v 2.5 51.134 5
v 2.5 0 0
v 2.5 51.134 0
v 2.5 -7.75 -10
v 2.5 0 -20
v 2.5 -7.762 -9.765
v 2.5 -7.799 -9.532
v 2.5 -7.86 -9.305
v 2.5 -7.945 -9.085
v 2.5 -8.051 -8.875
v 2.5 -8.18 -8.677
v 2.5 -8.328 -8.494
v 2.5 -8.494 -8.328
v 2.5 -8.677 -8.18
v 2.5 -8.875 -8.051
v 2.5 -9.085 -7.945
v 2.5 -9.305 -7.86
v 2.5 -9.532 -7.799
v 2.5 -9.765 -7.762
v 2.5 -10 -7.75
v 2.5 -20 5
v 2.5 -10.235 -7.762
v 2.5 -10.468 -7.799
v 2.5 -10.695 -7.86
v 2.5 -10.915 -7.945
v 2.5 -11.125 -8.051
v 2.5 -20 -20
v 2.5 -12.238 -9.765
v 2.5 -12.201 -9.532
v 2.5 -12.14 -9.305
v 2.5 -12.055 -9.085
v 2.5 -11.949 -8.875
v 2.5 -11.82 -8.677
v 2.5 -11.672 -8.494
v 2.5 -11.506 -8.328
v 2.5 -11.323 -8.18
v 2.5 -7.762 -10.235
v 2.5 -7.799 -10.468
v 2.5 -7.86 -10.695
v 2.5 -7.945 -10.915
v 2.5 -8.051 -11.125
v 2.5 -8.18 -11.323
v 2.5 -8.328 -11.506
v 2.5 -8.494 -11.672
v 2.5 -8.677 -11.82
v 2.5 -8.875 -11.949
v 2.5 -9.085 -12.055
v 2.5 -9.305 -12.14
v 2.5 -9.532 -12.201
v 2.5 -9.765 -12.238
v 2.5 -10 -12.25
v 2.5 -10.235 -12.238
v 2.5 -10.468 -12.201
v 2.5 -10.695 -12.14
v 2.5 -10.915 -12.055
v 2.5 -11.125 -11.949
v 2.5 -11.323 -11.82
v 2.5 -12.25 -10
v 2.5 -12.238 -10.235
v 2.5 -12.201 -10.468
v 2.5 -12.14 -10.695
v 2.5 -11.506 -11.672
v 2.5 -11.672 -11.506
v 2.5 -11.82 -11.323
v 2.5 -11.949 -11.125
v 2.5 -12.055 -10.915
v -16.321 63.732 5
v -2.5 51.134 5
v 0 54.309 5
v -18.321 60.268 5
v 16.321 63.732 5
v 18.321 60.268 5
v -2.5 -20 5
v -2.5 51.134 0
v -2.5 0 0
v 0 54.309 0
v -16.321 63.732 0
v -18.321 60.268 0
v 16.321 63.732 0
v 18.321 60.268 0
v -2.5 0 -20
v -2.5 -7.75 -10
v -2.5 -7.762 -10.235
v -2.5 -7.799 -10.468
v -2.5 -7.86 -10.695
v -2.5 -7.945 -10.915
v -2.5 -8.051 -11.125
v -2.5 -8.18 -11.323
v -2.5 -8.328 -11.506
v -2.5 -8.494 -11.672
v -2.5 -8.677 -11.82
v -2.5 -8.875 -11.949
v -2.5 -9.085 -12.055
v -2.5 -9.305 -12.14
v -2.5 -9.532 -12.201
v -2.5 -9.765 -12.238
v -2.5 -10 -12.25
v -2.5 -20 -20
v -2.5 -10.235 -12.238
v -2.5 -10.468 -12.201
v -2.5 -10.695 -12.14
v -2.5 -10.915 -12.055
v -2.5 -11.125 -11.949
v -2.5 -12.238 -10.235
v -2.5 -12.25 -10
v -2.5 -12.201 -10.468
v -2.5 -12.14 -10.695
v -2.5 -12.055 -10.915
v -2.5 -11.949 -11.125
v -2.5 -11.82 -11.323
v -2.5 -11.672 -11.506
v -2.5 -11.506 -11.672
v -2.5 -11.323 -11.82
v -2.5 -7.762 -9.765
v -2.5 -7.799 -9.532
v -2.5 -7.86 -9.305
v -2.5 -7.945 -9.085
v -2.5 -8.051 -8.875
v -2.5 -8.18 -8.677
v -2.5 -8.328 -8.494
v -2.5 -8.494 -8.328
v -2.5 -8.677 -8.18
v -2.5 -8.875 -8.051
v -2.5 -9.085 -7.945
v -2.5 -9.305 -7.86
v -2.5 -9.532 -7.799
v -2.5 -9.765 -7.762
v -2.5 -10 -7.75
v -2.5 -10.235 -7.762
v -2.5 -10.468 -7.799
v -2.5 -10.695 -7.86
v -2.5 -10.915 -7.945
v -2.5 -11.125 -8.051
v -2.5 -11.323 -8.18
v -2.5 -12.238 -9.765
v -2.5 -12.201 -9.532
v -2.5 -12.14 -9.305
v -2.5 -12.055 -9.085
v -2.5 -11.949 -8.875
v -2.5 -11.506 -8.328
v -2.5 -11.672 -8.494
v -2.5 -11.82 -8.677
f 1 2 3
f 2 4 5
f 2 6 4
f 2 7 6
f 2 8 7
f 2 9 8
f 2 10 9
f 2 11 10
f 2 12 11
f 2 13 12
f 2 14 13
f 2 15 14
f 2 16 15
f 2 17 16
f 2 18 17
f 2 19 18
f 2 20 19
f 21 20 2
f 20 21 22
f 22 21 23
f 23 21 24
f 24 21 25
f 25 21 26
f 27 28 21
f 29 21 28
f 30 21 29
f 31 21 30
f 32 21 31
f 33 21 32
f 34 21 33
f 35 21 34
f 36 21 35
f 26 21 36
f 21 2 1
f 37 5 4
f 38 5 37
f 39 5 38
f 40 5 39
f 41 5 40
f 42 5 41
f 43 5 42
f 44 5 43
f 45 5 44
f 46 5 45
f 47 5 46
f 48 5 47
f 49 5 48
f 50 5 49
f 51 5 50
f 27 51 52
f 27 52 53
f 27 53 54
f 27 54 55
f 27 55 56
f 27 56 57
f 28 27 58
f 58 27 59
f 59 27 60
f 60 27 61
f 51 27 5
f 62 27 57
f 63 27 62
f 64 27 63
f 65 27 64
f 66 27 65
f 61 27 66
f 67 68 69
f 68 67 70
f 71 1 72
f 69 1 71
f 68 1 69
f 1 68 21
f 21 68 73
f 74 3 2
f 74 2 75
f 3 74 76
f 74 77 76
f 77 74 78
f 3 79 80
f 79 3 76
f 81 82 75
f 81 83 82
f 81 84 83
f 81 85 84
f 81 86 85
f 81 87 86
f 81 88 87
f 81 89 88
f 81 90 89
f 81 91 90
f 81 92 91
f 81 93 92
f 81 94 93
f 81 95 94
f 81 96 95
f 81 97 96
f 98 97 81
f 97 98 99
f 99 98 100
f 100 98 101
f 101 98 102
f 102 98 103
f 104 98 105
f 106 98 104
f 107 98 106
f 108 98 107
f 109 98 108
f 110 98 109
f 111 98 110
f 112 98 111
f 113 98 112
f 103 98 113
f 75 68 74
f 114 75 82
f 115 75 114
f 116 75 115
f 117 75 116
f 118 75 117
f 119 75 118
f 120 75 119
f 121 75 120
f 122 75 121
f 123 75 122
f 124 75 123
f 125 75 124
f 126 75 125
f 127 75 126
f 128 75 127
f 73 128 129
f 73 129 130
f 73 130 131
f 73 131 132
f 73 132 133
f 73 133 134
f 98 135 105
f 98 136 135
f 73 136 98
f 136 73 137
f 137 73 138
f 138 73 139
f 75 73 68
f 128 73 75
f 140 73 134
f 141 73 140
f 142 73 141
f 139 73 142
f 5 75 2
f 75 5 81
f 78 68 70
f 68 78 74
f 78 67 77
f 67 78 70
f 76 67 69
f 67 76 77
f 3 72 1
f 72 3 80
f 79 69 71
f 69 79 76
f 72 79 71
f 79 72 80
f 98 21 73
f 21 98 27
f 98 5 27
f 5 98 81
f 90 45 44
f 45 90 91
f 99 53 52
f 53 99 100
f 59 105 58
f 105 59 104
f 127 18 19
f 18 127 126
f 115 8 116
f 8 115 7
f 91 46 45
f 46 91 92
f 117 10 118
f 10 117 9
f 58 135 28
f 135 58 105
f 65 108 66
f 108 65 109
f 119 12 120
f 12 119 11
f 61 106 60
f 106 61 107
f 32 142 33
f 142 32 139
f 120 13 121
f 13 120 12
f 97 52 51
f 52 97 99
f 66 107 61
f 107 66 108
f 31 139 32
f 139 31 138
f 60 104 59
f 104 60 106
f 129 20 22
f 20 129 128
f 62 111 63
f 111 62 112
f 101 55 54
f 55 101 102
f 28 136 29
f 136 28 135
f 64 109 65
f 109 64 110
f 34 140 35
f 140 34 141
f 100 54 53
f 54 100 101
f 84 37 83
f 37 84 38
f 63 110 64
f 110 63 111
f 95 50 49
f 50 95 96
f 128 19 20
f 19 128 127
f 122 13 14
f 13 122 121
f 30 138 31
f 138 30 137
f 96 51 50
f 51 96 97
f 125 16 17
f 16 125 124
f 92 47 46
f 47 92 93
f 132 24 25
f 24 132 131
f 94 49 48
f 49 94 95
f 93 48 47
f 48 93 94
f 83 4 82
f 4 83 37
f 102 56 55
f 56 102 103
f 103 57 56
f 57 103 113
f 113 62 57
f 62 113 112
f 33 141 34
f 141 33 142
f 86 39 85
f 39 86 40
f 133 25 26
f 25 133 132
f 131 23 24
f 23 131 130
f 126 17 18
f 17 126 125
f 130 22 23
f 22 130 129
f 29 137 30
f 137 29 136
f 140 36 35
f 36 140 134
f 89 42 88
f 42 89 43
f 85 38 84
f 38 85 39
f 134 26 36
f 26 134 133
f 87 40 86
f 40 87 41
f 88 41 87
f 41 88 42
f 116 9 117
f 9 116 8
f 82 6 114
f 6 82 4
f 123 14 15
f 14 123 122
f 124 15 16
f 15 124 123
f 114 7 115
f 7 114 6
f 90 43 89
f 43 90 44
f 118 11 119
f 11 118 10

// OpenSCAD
// ==== Thông số ====
thickness = 5;   // độ dày theo trục Z
stem_height = 52; // chiều cao thân dọc
stem_width = 5;   // độ rộng thân dọc
arm_length =20;  // độ dài mỗi nhánh
arm_width = 4;    // độ rộng nhánh
angle_out = 60;   // góc xoay hai nhánh ra ngoài (độ)

difference() {
    union() {
        // Thân dọc (giữa chữ Y)
        translate([-stem_width/2, 0, 0])
            cube([stem_width, stem_height, thickness]);

        // Nhánh trái
        translate([0, stem_height, 0])
            rotate([0, 0, angle_out])
                translate([-arm_width/2, 0, 0])
                    cube([arm_width, arm_length, thickness]);

        // Nhánh phải
        translate([0, stem_height, 0])
            rotate([0, 0, -angle_out])
                translate([-arm_width/2, 0, 0])
                    cube([arm_width, arm_length, thickness]);
        // Left flange
        rotate([90, 90, 0])
        rotate([0, 90, 0])
        translate([-20, -2.5, -5])
        cube([20, 5, 25], center = false);
       
    } 
   // Holes for M4 bolts (Ø4.5 mm)
    translate([0, -10, -10])
    rotate([90, 90, 0])
    rotate([90, 0, 0])
        cylinder(h =  10, r = 2.25, center = true, $fn = 60);
    
}
